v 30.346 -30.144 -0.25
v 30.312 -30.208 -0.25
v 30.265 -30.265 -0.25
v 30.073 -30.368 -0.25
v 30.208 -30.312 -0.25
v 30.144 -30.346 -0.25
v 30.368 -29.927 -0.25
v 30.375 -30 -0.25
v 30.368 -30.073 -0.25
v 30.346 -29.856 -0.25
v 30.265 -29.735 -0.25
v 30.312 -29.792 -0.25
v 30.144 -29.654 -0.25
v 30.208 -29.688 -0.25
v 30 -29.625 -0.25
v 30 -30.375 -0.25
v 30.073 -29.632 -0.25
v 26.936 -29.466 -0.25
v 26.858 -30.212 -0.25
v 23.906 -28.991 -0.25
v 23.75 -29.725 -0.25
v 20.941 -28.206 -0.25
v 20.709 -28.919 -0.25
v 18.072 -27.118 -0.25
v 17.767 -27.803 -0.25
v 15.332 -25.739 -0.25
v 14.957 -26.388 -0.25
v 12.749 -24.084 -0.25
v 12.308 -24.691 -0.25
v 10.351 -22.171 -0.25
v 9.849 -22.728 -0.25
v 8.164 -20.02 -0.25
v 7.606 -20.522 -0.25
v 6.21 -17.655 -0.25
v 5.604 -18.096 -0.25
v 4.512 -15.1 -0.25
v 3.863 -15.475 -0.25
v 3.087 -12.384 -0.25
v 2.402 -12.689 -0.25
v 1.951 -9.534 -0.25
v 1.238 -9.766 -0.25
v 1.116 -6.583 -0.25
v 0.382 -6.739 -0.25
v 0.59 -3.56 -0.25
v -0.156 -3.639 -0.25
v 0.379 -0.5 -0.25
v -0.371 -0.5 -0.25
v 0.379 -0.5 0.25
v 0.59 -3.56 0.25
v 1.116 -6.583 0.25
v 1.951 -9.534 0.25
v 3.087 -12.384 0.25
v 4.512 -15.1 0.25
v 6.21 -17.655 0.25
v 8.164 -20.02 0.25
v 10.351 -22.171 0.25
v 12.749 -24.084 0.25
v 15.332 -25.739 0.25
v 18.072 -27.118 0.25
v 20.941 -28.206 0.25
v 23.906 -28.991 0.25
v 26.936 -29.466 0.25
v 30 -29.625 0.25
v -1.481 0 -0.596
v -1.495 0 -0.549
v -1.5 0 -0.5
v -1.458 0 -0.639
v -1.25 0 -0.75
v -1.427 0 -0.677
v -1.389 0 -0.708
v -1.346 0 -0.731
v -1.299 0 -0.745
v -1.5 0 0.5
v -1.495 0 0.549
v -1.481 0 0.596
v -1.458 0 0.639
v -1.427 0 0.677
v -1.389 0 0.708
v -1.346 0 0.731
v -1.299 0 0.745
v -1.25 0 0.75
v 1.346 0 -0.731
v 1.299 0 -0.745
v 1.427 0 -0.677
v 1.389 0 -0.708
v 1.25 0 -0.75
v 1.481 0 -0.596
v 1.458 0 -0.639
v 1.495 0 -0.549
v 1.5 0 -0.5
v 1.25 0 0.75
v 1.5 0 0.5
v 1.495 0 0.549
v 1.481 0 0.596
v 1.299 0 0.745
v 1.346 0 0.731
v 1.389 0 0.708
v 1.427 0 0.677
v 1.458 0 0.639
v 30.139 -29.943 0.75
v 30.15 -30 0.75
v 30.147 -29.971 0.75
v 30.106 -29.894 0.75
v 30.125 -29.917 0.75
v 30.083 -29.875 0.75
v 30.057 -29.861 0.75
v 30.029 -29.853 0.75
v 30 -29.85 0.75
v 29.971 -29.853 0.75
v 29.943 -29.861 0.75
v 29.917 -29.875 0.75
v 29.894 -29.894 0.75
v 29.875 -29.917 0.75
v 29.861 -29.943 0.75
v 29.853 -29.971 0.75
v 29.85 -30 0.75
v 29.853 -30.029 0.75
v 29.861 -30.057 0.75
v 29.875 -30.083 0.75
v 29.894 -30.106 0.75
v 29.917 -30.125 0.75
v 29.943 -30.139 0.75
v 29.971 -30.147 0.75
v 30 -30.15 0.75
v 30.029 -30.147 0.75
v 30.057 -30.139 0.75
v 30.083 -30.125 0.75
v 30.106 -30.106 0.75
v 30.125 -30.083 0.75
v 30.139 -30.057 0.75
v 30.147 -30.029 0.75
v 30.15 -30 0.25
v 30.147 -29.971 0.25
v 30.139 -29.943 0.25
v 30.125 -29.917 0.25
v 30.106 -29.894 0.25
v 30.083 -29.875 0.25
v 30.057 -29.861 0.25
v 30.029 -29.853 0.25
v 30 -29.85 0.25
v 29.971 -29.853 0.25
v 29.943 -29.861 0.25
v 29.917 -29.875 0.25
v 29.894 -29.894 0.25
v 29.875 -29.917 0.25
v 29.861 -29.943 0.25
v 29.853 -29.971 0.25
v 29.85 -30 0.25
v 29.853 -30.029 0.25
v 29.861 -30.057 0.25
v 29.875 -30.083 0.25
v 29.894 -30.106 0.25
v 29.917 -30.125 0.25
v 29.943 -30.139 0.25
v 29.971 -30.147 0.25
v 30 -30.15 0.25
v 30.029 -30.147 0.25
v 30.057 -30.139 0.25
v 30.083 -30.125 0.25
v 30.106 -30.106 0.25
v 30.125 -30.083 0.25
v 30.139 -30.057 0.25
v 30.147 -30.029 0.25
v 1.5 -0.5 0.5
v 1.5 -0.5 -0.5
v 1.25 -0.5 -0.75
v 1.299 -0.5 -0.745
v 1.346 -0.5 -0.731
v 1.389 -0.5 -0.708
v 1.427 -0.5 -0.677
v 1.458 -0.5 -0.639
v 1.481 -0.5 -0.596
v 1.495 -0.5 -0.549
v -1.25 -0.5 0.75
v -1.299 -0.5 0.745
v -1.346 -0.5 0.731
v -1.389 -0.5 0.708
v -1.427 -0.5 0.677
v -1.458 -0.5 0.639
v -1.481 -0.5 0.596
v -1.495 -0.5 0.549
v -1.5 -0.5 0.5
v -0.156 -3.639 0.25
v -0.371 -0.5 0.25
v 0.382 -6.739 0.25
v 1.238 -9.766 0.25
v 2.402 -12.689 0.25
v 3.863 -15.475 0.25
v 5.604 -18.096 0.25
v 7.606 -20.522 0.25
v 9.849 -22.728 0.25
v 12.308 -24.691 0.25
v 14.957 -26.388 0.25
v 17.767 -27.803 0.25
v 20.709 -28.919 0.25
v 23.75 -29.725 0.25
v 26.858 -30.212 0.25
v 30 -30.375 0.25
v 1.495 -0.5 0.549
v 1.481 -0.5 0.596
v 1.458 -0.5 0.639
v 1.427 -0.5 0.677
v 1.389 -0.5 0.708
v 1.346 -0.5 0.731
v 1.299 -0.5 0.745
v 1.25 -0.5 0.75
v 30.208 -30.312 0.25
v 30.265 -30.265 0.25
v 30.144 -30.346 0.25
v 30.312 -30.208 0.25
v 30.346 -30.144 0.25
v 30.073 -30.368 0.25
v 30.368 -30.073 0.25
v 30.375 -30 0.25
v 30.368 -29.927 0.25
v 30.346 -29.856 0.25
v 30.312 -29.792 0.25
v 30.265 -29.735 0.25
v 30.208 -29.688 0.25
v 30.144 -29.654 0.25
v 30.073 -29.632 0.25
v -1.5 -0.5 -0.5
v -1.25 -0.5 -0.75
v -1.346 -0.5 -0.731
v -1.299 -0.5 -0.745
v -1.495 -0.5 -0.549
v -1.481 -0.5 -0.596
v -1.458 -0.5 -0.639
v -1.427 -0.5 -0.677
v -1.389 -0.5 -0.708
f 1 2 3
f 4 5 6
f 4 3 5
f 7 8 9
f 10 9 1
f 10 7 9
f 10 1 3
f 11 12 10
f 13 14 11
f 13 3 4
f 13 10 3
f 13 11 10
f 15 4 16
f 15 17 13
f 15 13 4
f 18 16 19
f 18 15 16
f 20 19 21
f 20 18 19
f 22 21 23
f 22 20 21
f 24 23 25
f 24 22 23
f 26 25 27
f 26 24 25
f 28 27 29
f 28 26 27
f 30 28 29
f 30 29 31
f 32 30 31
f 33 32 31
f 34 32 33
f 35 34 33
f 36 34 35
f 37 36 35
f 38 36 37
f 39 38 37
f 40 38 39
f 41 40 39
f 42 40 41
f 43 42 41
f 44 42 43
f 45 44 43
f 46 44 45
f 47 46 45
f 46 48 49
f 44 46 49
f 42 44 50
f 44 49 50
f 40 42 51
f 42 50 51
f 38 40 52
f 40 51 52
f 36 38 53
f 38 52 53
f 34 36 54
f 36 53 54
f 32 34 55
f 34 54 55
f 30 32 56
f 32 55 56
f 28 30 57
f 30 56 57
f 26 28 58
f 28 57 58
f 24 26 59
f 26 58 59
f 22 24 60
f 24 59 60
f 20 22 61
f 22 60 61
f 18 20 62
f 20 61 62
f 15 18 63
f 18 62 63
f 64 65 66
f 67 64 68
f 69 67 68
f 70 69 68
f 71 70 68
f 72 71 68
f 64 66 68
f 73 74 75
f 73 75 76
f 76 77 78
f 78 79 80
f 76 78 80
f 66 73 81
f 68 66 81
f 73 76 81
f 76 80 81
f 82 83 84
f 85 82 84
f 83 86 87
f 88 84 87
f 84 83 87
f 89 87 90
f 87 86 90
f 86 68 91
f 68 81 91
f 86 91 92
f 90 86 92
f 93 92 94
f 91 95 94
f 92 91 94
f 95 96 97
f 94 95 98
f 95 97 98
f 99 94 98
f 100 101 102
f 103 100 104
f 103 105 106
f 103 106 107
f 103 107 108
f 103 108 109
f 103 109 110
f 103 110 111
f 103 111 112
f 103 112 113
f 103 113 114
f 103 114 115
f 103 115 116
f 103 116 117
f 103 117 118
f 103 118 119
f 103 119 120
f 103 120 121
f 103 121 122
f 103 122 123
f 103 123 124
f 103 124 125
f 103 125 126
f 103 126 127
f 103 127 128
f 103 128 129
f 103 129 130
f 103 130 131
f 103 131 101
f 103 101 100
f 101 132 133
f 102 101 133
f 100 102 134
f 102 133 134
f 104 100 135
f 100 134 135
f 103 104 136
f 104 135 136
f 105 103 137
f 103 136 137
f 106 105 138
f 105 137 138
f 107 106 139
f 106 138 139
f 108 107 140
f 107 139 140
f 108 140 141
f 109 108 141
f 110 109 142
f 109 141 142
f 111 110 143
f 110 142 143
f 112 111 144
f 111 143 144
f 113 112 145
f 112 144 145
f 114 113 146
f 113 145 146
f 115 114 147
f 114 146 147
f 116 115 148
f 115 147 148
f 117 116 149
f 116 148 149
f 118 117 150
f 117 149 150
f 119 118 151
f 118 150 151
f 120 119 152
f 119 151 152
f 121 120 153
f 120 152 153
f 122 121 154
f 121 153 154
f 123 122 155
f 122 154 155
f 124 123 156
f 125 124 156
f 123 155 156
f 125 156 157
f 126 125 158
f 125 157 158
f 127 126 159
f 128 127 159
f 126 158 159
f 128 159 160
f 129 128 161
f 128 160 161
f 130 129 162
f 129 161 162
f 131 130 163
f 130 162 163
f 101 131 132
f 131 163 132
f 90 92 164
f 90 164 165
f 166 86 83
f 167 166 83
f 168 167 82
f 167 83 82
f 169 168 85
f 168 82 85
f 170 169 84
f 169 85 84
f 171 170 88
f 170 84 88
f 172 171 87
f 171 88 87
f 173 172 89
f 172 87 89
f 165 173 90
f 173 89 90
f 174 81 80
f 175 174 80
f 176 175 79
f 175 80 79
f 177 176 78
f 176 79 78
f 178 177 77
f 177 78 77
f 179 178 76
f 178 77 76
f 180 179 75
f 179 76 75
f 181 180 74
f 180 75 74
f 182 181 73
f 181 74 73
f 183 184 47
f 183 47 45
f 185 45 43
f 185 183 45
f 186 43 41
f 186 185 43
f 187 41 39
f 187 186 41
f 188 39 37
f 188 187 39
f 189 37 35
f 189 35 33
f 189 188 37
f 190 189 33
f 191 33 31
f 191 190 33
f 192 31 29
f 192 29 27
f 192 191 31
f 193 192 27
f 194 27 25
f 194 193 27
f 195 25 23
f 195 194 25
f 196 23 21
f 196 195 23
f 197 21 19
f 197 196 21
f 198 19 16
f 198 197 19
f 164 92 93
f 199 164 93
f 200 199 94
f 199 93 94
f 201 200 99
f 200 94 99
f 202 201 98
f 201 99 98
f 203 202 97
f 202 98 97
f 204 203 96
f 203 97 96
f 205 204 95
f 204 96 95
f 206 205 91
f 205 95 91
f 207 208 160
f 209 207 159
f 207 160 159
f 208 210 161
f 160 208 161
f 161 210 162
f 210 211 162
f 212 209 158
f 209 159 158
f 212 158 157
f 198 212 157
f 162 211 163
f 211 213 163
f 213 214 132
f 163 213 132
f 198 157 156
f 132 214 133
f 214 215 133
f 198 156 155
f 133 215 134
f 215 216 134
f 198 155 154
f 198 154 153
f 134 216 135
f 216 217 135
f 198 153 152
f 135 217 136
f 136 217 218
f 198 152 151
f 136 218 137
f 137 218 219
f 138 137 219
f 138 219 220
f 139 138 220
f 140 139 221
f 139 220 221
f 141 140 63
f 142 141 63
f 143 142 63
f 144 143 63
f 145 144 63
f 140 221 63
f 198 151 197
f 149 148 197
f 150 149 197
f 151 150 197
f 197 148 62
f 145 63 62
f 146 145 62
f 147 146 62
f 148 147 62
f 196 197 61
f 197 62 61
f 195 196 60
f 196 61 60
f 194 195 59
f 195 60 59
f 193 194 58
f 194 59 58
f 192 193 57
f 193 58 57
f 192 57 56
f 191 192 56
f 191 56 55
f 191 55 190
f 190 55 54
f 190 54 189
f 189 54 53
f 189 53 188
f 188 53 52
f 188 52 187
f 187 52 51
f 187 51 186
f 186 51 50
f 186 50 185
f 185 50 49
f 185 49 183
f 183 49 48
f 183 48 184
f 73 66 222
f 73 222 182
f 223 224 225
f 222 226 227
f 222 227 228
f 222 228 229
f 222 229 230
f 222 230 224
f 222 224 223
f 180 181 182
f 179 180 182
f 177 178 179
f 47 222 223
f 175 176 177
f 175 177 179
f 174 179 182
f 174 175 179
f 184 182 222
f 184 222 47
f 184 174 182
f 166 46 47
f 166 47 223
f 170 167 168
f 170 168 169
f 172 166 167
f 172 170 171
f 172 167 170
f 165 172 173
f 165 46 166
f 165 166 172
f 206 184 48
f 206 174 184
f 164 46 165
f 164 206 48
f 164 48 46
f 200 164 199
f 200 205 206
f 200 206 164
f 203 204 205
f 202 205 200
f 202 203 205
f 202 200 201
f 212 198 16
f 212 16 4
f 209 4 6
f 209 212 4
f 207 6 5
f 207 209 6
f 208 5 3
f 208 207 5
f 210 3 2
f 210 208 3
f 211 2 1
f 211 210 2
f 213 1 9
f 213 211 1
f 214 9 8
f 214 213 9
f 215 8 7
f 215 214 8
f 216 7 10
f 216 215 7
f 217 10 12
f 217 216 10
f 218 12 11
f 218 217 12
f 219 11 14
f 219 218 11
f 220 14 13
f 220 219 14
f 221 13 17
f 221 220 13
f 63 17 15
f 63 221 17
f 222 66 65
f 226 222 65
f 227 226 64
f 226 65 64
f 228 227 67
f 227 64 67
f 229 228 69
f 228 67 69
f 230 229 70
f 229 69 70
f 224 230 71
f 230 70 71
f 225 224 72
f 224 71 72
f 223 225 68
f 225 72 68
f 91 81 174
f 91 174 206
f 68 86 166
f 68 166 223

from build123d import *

# Parameters (mm, degrees)
PAD_DEPTH    = 0.25
PAD001_DEPTH = 0.5
SKETCH003_R  = 0.15
PAD002_DEPTH = 0.5


with BuildPart() as part:
    # Sketch → Pad (new body, symmetric)
    with BuildSketch(Plane.XY):
        with BuildLine():
            Line((-0.375, 0), (0, 0))
            Line((0, 0), (0.375, 0))
            ThreePointArc((0.375, 0), (9.051962, -20.948038), (30, -29.625))
            ThreePointArc((30.000004, -30.375), (30.375, -29.999998), (30, -29.625))
            ThreePointArc((-0.375, 0), (8.521633, -21.47837), (30.000004, -30.375))
        make_face()
    extrude(amount=PAD_DEPTH, both=True)

    # Sketch002 → Pad001 (join)
    with BuildSketch(Plane.XZ):
        with BuildLine():
            ThreePointArc((-1.25, 0.75), (-1.426777, 0.676777), (-1.5, 0.5))
            Line((-1.5, -0.5), (-1.5, 0.5))
            ThreePointArc((-1.5, -0.5), (-1.426777, -0.676777), (-1.25, -0.75))
            Line((1.25, -0.75), (-1.25, -0.75))
            ThreePointArc((1.25, -0.75), (1.426777, -0.676777), (1.5, -0.5))
            Line((1.5, 0.5), (1.5, -0.5))
            ThreePointArc((1.5, 0.5), (1.426777, 0.676777), (1.25, 0.75))
            Line((-1.25, 0.75), (1.25, 0.75))
        make_face()
    extrude(amount=PAD001_DEPTH)

    # Sketch003 (on DatumPlane) → Pad002 (join)
    with BuildSketch(Plane(origin=(30, -30, 0.25), x_dir=(1, 0, 0), z_dir=(0, 0, 1))):
        Circle(SKETCH003_R)
    extrude(amount=PAD002_DEPTH)


solid = part.part
